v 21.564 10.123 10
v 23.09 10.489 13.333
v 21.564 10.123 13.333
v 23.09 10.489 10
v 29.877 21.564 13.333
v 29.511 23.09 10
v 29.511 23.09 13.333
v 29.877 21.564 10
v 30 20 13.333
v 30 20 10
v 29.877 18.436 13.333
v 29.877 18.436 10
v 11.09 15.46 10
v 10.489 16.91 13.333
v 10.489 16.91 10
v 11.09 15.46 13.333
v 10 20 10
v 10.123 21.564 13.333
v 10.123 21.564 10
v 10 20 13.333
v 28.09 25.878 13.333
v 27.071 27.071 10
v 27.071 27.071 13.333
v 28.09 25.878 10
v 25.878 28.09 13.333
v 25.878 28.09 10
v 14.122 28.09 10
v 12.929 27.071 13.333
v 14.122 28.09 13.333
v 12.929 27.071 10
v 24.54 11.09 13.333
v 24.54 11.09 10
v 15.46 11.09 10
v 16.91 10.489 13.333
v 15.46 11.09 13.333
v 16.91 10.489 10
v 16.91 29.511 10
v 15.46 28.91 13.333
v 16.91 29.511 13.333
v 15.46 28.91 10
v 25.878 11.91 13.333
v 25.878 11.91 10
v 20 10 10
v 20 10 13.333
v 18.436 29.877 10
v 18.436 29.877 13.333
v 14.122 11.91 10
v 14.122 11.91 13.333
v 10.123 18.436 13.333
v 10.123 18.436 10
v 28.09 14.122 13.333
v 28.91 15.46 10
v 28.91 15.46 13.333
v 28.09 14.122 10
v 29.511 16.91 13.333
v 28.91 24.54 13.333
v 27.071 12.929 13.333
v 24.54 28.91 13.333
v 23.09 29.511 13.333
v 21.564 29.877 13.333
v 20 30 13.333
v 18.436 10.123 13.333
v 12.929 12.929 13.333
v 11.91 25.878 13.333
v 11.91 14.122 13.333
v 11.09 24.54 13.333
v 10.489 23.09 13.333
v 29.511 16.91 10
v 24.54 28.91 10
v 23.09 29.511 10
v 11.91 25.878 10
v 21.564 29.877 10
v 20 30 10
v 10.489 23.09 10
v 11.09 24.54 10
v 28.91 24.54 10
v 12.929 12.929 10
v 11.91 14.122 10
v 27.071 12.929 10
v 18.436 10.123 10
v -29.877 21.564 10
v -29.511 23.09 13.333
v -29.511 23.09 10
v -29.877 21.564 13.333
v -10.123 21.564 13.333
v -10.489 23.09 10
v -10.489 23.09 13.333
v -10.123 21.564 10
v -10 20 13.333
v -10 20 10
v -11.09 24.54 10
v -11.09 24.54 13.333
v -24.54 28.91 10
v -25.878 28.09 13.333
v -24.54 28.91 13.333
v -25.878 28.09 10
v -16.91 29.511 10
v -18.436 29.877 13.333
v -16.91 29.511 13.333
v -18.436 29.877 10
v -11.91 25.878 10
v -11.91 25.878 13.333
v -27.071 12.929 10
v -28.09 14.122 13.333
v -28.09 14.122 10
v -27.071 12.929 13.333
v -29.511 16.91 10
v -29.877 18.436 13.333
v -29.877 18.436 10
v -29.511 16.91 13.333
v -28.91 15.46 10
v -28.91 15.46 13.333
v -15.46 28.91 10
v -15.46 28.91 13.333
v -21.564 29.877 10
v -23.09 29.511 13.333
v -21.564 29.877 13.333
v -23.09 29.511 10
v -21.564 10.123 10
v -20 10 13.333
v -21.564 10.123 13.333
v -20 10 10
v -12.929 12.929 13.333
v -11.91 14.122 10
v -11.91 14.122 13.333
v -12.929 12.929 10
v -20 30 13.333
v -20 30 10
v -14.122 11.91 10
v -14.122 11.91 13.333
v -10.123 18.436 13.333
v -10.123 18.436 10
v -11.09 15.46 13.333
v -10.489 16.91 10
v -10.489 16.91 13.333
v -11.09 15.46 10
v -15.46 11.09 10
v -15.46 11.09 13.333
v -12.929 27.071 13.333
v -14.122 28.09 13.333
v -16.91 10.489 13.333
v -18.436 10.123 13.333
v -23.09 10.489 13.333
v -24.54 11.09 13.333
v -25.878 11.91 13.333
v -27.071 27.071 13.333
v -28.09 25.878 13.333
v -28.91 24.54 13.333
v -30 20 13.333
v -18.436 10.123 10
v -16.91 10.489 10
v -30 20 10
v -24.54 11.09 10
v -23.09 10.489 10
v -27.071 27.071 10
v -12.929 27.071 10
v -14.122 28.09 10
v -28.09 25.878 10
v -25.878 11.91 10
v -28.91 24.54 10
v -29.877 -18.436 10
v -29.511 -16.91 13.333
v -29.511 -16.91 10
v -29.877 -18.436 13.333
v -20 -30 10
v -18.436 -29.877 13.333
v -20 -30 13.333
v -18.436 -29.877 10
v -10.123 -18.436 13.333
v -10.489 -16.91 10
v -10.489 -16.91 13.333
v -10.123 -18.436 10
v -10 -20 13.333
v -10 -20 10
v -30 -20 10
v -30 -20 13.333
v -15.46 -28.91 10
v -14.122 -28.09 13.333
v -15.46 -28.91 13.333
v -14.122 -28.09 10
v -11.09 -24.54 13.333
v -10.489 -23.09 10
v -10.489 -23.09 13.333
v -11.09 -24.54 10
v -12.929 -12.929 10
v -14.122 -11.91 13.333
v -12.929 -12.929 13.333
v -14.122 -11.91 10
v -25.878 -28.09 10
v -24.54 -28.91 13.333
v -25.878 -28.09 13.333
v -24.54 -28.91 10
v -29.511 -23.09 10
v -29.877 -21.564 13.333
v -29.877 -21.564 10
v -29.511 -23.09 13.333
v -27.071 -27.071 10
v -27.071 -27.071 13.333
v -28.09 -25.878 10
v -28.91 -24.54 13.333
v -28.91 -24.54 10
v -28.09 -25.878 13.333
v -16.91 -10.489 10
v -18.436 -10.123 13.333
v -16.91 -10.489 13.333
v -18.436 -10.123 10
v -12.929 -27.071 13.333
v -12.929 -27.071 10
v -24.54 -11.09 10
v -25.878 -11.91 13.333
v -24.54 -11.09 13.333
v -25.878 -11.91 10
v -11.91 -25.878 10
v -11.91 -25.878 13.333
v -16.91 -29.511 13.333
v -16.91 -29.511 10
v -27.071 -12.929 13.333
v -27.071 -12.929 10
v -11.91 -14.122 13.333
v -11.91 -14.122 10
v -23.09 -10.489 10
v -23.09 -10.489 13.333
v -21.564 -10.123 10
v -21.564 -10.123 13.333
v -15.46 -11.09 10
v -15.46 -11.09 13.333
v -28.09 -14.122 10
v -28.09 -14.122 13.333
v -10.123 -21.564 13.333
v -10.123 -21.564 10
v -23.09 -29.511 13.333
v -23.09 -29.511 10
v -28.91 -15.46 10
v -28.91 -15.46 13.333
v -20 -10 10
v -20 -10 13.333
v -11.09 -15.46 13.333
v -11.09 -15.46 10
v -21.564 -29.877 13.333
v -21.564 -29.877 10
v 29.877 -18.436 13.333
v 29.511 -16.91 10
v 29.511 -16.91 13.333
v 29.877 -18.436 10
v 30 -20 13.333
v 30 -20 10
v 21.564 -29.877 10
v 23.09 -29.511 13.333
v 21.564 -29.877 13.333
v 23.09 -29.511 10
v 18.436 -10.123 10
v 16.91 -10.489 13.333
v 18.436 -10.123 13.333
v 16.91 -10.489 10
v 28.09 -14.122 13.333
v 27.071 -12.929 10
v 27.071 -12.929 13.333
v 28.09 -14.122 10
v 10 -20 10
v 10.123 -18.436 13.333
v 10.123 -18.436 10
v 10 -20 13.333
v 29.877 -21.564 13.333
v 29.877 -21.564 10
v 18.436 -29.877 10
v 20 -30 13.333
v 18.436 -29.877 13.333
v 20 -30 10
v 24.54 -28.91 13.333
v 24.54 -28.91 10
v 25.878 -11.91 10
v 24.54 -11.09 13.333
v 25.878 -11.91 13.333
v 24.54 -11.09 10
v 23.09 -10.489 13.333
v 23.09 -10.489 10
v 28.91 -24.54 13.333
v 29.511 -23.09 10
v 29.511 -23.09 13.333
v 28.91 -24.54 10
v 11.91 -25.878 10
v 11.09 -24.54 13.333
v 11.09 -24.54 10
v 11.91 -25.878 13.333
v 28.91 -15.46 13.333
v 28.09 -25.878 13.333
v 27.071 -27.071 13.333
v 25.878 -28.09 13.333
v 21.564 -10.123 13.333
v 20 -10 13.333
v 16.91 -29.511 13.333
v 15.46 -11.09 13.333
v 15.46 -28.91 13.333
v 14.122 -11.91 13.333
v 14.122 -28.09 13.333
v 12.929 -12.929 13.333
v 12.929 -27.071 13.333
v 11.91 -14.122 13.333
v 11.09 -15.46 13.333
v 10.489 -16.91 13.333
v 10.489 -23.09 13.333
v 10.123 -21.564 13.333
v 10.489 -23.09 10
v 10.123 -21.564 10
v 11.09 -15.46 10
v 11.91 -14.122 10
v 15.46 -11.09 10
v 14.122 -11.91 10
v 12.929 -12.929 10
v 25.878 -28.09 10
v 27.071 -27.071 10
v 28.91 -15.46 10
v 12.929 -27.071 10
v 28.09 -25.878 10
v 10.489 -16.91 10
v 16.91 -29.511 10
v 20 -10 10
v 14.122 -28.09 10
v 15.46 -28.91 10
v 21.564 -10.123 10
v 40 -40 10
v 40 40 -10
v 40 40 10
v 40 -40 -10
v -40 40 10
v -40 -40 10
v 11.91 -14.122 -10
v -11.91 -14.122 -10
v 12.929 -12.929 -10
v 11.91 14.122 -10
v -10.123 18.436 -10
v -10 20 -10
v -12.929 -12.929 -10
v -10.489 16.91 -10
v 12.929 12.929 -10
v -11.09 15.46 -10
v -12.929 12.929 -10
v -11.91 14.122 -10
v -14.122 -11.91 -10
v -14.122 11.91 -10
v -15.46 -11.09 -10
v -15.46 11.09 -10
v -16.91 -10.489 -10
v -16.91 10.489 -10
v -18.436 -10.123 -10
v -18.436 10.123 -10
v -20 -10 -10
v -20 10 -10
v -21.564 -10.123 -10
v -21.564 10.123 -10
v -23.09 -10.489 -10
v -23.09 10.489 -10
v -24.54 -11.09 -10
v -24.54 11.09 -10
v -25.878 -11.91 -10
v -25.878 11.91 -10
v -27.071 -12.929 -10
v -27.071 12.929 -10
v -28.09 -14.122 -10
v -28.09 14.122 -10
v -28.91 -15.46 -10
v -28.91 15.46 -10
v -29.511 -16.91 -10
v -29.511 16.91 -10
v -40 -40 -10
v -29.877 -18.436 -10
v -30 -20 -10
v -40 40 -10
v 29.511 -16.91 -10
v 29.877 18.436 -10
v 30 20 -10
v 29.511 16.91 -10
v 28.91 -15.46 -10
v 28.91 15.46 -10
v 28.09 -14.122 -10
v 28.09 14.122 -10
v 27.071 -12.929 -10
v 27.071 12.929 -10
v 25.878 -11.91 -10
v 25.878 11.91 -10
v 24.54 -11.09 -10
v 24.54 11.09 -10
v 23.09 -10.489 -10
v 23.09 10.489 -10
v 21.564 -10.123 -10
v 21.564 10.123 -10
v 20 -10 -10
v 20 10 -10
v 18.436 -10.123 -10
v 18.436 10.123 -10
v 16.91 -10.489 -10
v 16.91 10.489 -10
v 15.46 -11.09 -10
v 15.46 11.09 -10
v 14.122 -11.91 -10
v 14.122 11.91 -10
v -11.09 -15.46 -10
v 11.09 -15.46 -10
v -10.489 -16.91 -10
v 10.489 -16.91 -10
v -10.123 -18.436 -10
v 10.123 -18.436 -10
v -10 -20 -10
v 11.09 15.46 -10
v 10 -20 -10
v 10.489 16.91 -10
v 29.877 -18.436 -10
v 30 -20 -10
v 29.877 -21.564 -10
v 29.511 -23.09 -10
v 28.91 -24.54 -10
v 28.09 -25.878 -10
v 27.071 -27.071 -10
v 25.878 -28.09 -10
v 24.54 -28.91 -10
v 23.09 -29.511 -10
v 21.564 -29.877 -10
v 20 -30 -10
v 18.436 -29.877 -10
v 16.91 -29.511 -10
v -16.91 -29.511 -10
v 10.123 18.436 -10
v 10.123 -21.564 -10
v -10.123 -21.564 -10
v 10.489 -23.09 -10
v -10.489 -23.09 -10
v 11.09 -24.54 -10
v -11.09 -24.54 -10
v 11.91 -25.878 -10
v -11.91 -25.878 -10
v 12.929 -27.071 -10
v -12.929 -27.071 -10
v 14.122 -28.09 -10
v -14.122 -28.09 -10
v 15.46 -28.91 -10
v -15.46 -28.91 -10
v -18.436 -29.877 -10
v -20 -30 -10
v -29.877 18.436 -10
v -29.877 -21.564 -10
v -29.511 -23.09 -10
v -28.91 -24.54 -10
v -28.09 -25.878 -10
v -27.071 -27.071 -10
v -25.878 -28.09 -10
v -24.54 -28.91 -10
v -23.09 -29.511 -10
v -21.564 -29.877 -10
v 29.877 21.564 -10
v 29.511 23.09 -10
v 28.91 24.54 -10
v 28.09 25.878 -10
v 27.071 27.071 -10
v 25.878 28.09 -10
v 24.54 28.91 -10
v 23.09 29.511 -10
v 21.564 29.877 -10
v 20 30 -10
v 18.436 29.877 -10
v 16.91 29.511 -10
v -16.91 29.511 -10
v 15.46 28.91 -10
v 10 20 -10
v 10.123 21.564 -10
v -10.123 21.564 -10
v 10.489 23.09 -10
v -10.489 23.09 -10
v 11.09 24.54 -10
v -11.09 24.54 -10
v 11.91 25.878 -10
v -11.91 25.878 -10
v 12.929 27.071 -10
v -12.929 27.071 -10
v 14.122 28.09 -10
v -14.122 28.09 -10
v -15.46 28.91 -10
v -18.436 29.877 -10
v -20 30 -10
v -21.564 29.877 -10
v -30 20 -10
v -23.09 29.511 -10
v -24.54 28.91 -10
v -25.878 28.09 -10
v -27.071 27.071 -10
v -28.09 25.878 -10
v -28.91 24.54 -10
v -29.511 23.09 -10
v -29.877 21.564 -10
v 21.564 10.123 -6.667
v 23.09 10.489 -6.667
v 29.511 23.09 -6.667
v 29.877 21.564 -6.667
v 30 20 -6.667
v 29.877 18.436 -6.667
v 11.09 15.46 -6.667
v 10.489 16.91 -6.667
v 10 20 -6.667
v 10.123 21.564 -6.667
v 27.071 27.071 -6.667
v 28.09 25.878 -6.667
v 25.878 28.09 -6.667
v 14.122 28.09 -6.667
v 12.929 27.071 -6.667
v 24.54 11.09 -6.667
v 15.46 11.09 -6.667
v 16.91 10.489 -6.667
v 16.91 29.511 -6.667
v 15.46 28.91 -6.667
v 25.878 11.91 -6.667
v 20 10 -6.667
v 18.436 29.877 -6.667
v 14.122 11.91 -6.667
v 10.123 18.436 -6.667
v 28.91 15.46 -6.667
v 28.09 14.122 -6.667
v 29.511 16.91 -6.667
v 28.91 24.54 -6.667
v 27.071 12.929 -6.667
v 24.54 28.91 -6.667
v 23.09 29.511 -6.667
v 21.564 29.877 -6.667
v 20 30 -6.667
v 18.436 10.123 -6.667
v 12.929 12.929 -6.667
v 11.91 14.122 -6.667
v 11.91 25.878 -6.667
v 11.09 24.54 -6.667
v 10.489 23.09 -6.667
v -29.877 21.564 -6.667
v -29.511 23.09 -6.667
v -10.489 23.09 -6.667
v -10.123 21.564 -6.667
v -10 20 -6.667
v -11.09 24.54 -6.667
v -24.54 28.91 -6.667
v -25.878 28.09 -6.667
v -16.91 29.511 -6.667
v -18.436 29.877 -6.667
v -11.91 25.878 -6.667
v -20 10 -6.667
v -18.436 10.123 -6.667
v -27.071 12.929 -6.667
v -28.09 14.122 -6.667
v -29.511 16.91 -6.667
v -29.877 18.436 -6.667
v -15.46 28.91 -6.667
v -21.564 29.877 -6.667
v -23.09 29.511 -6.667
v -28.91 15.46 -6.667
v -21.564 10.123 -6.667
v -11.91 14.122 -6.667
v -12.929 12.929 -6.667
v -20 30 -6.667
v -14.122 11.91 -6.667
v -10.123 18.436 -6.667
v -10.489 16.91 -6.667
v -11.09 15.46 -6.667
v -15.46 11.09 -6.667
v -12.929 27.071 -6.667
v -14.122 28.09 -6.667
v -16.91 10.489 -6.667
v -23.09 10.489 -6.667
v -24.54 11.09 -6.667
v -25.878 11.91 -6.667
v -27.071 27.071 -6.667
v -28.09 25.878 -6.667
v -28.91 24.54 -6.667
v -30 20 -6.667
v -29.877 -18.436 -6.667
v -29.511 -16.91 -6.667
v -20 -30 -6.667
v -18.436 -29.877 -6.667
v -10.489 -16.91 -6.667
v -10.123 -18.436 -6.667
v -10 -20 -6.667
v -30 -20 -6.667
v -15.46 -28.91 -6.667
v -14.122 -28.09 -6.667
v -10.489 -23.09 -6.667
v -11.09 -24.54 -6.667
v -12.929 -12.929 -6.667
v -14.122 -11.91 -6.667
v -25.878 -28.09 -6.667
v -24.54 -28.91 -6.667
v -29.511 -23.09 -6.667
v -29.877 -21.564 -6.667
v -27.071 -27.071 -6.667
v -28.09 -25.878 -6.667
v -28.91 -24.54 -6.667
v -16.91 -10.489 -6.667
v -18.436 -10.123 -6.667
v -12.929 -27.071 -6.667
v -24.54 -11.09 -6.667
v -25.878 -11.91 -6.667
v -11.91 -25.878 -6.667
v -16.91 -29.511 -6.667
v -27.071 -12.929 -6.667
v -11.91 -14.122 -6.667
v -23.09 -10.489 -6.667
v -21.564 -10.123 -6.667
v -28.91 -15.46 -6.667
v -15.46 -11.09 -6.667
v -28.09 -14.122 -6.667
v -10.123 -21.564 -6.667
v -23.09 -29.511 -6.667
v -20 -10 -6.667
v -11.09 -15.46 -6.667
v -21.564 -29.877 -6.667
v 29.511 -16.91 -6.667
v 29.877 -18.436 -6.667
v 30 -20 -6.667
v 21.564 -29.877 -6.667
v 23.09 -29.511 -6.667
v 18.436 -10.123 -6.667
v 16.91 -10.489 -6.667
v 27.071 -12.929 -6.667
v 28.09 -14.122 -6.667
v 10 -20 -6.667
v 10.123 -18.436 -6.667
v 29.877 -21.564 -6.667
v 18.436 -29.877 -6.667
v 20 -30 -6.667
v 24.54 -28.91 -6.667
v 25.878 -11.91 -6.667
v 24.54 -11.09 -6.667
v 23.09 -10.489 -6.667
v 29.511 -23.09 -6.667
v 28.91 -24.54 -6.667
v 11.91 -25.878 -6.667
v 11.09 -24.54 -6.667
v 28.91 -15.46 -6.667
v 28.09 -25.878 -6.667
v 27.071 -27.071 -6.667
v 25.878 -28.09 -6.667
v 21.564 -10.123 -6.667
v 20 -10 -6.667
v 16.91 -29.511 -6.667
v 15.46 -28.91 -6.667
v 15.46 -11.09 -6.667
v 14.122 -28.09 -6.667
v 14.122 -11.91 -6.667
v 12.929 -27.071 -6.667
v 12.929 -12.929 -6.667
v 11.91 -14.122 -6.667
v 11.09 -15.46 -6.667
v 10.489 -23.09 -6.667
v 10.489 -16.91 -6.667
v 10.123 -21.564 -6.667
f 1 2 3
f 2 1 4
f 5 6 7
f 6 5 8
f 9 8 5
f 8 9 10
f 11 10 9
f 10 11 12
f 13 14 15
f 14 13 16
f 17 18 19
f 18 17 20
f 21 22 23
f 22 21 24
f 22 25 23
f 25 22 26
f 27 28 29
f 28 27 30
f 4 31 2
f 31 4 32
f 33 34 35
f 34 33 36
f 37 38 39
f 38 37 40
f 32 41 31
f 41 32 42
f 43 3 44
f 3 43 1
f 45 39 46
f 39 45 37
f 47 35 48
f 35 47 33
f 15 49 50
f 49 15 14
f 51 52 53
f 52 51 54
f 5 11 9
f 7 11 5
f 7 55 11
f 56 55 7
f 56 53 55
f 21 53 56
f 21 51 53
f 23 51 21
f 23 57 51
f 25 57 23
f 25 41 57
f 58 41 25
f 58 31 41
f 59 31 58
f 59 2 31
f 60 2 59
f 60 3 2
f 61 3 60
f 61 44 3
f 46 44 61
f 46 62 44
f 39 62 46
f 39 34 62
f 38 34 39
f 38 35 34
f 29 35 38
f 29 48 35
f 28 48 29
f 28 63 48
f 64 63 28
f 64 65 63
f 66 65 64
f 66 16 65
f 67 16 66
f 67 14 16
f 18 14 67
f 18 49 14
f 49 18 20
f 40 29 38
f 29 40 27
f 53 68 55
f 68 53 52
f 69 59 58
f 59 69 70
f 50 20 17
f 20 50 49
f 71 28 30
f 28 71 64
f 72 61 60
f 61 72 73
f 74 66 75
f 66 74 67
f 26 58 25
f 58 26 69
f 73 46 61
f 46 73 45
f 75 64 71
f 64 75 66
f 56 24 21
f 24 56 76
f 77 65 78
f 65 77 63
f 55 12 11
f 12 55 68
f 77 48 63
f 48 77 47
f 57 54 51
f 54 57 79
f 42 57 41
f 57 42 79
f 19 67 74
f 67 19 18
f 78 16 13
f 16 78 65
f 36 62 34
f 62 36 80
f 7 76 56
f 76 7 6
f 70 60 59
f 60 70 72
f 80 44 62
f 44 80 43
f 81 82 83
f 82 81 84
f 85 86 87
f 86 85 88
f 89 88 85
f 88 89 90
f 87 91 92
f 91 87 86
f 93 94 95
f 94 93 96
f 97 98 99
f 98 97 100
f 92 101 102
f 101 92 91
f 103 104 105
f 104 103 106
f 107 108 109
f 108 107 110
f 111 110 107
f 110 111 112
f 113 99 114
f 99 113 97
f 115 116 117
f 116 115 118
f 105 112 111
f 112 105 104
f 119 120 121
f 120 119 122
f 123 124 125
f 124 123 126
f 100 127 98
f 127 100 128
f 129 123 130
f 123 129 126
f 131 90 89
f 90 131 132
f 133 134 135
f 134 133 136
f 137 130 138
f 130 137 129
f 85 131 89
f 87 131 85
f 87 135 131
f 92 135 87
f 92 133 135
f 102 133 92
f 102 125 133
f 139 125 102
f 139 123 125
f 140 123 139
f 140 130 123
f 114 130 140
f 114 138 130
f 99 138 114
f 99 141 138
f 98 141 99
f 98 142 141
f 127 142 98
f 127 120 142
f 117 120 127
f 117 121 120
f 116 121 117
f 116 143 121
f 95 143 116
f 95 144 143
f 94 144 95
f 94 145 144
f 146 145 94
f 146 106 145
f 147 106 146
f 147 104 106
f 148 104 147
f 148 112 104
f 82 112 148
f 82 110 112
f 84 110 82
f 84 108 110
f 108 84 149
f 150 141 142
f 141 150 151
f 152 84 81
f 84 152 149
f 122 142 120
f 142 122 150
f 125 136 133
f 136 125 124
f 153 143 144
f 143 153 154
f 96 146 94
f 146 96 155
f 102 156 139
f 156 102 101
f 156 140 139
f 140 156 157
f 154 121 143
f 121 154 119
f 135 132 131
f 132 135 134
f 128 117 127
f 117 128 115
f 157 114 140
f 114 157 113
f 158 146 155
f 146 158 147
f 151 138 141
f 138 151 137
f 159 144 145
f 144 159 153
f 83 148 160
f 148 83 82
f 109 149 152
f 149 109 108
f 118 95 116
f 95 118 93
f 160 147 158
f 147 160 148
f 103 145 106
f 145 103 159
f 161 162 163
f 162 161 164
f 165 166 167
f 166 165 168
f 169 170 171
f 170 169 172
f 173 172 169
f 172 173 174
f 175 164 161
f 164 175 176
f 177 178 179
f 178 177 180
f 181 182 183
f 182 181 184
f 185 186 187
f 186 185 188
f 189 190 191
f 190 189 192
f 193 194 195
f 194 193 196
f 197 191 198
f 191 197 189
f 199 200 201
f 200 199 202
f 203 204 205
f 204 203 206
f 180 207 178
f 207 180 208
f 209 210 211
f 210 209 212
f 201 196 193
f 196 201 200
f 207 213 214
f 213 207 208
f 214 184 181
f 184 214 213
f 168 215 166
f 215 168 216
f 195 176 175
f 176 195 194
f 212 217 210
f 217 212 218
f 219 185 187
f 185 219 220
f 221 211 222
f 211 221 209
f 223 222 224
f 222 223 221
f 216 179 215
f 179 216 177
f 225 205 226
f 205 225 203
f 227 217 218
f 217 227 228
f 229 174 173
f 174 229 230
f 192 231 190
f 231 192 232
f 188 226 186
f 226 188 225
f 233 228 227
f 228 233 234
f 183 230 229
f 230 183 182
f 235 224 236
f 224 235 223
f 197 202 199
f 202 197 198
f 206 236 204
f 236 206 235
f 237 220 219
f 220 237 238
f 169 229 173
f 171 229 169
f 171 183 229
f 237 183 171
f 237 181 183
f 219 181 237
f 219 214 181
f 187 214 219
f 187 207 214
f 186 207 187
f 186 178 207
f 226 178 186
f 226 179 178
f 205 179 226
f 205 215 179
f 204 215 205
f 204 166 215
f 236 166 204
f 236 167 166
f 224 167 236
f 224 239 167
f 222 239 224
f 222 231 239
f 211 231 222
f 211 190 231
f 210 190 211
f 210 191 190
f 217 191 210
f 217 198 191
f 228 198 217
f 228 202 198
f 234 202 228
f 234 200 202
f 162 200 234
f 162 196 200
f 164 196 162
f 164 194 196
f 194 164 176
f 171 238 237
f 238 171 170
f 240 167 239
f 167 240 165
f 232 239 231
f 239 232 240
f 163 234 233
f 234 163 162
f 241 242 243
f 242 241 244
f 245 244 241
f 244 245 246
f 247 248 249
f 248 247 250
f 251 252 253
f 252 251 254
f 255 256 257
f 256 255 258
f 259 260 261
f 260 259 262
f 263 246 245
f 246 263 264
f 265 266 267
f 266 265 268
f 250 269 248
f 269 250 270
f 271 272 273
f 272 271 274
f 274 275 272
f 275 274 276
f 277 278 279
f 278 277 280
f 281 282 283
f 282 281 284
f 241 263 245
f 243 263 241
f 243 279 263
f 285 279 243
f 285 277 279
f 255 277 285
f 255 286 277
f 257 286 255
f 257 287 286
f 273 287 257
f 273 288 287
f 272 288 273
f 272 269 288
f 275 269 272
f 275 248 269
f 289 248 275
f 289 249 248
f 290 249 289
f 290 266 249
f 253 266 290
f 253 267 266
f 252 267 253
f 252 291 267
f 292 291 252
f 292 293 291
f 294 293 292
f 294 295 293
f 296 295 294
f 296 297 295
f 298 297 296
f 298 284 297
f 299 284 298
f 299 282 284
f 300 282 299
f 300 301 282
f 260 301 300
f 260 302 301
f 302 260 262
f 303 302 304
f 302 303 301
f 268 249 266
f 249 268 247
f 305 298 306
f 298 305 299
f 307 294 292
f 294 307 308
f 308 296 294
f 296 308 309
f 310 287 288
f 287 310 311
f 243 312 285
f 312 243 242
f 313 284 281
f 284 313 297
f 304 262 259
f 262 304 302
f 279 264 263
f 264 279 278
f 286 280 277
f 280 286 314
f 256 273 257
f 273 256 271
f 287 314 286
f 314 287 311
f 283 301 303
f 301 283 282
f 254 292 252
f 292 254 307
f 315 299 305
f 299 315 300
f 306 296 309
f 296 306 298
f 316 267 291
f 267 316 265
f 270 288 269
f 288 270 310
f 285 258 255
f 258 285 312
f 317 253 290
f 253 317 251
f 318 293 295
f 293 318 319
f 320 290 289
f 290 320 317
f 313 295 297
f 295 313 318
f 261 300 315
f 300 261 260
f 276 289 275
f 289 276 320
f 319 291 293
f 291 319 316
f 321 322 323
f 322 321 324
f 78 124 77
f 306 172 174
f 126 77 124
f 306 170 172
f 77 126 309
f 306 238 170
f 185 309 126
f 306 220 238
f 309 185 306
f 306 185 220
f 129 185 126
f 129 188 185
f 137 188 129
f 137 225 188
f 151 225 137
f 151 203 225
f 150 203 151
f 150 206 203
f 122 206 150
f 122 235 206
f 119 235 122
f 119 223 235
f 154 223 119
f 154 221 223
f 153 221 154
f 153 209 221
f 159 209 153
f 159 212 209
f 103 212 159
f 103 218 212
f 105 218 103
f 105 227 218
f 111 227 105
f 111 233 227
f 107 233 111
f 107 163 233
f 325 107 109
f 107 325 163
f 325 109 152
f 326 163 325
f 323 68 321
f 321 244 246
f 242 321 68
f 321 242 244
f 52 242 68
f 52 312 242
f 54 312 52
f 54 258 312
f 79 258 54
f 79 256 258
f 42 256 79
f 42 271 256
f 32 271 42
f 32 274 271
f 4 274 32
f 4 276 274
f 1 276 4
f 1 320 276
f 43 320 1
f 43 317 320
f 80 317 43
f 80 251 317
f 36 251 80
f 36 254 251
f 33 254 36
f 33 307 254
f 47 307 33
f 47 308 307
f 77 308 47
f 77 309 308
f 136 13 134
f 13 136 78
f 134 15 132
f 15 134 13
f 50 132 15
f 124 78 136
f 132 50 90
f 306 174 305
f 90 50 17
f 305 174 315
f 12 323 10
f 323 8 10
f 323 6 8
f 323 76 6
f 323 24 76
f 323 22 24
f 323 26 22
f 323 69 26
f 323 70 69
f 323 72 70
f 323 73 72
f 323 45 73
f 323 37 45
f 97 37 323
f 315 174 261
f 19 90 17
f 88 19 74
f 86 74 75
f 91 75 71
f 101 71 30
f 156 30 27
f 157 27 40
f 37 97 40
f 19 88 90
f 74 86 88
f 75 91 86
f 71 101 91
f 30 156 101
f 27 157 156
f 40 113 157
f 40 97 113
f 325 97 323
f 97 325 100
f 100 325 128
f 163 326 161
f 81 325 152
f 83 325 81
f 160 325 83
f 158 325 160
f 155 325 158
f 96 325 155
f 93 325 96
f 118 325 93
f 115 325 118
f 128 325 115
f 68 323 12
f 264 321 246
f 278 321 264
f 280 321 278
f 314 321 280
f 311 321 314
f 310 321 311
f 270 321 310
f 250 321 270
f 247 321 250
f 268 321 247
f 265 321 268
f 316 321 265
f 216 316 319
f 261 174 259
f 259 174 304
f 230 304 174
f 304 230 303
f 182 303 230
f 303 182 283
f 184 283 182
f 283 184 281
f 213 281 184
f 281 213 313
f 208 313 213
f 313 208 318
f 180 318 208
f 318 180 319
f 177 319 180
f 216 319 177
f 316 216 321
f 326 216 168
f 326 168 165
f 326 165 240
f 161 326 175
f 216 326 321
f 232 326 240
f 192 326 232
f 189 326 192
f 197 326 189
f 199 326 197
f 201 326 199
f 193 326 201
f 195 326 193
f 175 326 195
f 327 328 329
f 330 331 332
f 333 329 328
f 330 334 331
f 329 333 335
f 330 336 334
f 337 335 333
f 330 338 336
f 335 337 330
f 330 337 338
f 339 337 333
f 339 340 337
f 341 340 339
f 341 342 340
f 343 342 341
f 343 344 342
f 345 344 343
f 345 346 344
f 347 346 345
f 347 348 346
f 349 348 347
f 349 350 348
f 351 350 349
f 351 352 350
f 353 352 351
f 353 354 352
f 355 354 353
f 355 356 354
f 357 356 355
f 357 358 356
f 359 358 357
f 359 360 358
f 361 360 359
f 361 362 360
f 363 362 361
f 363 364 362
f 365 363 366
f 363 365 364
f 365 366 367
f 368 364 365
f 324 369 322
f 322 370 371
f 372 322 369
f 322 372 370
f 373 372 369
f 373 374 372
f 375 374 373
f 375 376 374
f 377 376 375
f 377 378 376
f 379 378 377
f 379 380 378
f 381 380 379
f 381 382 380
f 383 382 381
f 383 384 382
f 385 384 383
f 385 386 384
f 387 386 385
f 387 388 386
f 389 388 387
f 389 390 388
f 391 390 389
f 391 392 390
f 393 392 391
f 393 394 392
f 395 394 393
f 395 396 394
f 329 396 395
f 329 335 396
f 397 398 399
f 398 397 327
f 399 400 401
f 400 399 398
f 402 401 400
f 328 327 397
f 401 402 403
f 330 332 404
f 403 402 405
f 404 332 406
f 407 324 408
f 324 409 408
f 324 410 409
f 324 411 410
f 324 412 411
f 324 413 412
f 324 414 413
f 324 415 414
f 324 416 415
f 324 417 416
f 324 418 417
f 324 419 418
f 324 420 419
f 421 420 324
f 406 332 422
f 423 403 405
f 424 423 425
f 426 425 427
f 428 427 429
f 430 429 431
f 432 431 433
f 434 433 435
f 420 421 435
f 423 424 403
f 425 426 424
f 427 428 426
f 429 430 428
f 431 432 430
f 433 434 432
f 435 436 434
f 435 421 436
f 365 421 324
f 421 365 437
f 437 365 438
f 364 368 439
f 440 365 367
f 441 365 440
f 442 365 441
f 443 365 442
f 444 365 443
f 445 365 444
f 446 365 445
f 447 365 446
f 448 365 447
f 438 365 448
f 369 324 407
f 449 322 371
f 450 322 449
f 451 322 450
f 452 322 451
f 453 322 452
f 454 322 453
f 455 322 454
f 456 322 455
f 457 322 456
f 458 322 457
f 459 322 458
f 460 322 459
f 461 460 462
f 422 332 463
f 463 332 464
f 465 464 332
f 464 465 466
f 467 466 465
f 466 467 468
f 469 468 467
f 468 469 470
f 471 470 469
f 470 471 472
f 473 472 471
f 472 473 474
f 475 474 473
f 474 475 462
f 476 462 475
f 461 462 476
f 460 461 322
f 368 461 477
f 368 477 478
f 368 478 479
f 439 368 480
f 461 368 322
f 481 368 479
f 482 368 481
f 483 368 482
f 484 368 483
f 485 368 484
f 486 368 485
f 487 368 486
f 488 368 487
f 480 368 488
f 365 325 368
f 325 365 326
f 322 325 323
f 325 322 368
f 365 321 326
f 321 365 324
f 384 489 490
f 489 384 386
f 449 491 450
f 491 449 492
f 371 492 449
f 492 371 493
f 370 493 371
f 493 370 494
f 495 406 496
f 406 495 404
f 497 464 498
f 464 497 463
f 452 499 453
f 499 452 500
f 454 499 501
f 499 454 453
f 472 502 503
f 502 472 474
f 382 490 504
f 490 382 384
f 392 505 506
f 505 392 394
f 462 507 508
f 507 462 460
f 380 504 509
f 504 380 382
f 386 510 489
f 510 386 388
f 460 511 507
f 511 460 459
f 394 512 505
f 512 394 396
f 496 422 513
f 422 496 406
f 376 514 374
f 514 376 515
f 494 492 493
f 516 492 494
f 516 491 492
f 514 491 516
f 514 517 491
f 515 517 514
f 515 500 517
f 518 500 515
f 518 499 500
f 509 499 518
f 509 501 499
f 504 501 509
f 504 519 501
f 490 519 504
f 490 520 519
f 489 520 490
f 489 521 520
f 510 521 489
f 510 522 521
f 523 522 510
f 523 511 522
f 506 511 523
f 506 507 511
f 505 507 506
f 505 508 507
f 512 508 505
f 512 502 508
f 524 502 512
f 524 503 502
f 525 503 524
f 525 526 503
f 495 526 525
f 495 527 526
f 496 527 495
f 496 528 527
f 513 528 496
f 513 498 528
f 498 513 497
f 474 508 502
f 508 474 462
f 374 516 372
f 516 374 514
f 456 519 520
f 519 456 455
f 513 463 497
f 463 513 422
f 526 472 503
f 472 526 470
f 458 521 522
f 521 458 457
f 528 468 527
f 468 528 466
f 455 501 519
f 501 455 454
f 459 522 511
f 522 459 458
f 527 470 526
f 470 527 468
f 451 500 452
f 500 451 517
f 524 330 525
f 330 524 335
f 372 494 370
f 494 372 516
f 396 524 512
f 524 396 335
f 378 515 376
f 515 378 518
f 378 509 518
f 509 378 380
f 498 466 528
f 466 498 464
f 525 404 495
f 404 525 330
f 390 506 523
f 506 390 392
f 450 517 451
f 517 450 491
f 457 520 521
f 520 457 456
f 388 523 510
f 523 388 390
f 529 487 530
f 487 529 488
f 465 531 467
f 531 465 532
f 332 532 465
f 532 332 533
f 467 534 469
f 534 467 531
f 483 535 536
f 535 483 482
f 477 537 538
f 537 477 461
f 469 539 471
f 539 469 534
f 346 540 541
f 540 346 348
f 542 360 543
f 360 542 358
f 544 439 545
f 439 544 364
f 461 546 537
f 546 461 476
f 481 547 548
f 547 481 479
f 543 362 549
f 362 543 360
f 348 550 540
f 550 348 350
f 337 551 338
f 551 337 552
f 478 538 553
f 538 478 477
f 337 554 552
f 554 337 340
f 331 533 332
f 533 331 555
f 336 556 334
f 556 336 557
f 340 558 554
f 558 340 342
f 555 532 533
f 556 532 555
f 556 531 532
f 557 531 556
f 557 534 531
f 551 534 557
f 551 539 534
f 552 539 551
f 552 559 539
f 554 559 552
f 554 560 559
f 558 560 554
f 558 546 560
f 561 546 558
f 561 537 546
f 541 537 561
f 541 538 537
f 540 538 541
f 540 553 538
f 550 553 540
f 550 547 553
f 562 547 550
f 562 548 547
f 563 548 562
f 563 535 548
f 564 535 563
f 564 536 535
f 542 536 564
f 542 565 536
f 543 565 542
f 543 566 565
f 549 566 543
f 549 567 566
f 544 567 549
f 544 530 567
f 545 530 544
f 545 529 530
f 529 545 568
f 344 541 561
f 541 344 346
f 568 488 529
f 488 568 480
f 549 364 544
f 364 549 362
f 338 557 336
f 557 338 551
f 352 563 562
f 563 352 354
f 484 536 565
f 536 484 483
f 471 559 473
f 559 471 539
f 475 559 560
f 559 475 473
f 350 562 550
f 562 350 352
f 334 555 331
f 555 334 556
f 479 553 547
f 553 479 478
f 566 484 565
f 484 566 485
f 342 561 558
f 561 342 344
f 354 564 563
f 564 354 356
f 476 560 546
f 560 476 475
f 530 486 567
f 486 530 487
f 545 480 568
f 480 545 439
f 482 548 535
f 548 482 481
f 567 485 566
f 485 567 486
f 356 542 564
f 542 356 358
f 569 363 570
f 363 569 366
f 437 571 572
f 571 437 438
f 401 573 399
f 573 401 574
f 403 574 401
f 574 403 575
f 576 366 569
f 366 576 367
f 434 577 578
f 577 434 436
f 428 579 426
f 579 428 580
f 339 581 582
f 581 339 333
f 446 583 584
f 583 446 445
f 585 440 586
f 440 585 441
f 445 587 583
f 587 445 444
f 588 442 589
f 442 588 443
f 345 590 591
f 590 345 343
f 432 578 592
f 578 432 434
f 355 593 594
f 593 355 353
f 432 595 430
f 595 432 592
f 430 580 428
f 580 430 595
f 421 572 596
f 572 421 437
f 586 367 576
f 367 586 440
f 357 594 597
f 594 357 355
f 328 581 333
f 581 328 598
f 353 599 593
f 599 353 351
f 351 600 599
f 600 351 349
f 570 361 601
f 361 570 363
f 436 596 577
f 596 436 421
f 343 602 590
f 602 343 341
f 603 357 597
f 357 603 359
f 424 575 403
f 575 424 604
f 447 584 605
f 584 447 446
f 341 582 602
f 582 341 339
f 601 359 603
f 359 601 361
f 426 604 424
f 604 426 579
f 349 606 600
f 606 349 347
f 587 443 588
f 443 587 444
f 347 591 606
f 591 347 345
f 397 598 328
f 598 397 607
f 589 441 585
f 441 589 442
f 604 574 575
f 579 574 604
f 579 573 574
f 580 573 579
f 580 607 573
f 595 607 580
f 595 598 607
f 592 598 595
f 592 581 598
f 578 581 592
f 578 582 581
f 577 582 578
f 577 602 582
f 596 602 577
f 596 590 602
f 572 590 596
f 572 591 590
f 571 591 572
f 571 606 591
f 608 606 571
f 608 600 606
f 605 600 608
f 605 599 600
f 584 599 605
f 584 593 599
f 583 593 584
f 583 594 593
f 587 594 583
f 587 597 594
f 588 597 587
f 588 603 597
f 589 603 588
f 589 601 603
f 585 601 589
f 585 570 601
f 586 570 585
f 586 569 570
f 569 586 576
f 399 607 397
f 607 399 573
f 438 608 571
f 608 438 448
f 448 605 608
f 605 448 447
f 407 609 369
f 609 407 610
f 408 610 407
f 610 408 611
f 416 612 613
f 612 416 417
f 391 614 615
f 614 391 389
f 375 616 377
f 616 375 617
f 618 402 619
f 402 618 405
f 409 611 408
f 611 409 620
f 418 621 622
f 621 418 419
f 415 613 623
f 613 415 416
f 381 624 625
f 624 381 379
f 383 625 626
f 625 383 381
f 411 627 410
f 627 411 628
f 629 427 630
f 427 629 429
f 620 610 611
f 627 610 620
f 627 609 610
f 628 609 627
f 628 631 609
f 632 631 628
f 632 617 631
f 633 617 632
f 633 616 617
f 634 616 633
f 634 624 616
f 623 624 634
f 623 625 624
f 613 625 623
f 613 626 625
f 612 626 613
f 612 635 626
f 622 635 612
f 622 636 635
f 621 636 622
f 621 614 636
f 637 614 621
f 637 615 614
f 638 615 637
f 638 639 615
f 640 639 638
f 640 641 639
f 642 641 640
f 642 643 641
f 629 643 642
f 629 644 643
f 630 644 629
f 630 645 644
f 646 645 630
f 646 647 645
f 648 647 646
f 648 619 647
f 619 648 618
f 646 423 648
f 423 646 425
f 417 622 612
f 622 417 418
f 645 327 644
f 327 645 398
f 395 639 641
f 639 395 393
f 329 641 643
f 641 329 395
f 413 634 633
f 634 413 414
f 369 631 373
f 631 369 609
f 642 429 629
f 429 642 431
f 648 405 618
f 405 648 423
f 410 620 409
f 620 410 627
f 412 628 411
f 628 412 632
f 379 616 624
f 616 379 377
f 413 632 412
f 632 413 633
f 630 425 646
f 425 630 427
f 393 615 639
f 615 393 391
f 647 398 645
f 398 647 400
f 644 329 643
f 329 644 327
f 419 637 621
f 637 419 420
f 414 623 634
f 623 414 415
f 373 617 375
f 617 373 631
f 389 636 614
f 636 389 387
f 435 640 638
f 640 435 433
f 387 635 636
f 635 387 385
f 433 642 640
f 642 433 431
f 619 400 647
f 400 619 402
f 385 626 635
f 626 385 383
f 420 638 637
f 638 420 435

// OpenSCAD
//Author: Chris Correll
//Date: 10/24/2022
//Description: Lesson 2-3 Combing shapes with booleans unions and nested booleans

//You can add shapes together with the union command
/*
union() {
 cube([10, 10, 10]);
 sphere(5);
}
*/

//Shapes always get added to together in OpenSCAD unless you use a boolean
/*
cube([10, 10, 10]);
sphere(5);
*/

//Make an ice cream cone with a union command
/*
union(){
  cylinder(h=15, r1=0, r2=5, center=true);
  translate([0,0,7.5])
    sphere(r=6);
}
*/

//We use a boolean union so we can group and nest shapes see what happens if you comment out the union command 
/*
difference() {
  union() {
    cube([10, 10, 10]);
    cylinder(h=10, r1=2, r2=2);
  }
  sphere(5);
}
*/

//Take a bite out of your ice cream cone!
/*
difference(){
  union(){
    cylinder(h=15, r1=0, r2=5, center=true);
    translate([0,0,7.5])
      sphere(r=6);
  }
  translate([0,5,10])
	sphere(r=3);
}
*/

//Make a 2 by 2 square lego brick
$fn = 40;
brick_size = 80;
brick_h = 20; //brick h is actually brick base height and add (brick_h/3)/2 to get actual brick height as nubs are offset byhalf and are brick_h/2 tall

difference(){
  //brick top
  union(){
	union(){
	  translate([brick_size/4,brick_size/4, brick_h/2])
		cylinder(h=brick_h/3, d=brick_size/4, center=true);
	  translate([-brick_size/4,brick_size/4, brick_h/2])
		cylinder(h=brick_h/3, d=brick_size/4, center=true);
	  translate([-brick_size/4,-brick_size/4, brick_h/2])
		cylinder(h=brick_h/3, d=brick_size/4, center=true);
	  translate([brick_size/4,-brick_size/4, brick_h/2])
		cylinder(h=brick_h/3, d=brick_size/4, center=true);
	}
	//brick
	cube([brick_size,brick_size,brick_h],center=true);
  }
	//brick bottom
	union(){
	  translate([brick_size/4,brick_size/4,-brick_h/2])
		cylinder(h=brick_h/3, d=brick_size/4, center=true);
	  translate([-brick_size/4,brick_size/4,-brick_h/2])
		cylinder(h=brick_h/3, d=brick_size/4, center=true);
	  translate([-brick_size/4,-brick_size/4,-brick_h/2])
		cylinder(h=brick_h/3, d=brick_size/4, center=true);
	  translate([brick_size/4,-brick_size/4,-brick_h/2])
		cylinder(h=brick_h/3, d=brick_size/4, center=true);
	}
}

//Bonus Parameterize your lego or ice cream cone!
